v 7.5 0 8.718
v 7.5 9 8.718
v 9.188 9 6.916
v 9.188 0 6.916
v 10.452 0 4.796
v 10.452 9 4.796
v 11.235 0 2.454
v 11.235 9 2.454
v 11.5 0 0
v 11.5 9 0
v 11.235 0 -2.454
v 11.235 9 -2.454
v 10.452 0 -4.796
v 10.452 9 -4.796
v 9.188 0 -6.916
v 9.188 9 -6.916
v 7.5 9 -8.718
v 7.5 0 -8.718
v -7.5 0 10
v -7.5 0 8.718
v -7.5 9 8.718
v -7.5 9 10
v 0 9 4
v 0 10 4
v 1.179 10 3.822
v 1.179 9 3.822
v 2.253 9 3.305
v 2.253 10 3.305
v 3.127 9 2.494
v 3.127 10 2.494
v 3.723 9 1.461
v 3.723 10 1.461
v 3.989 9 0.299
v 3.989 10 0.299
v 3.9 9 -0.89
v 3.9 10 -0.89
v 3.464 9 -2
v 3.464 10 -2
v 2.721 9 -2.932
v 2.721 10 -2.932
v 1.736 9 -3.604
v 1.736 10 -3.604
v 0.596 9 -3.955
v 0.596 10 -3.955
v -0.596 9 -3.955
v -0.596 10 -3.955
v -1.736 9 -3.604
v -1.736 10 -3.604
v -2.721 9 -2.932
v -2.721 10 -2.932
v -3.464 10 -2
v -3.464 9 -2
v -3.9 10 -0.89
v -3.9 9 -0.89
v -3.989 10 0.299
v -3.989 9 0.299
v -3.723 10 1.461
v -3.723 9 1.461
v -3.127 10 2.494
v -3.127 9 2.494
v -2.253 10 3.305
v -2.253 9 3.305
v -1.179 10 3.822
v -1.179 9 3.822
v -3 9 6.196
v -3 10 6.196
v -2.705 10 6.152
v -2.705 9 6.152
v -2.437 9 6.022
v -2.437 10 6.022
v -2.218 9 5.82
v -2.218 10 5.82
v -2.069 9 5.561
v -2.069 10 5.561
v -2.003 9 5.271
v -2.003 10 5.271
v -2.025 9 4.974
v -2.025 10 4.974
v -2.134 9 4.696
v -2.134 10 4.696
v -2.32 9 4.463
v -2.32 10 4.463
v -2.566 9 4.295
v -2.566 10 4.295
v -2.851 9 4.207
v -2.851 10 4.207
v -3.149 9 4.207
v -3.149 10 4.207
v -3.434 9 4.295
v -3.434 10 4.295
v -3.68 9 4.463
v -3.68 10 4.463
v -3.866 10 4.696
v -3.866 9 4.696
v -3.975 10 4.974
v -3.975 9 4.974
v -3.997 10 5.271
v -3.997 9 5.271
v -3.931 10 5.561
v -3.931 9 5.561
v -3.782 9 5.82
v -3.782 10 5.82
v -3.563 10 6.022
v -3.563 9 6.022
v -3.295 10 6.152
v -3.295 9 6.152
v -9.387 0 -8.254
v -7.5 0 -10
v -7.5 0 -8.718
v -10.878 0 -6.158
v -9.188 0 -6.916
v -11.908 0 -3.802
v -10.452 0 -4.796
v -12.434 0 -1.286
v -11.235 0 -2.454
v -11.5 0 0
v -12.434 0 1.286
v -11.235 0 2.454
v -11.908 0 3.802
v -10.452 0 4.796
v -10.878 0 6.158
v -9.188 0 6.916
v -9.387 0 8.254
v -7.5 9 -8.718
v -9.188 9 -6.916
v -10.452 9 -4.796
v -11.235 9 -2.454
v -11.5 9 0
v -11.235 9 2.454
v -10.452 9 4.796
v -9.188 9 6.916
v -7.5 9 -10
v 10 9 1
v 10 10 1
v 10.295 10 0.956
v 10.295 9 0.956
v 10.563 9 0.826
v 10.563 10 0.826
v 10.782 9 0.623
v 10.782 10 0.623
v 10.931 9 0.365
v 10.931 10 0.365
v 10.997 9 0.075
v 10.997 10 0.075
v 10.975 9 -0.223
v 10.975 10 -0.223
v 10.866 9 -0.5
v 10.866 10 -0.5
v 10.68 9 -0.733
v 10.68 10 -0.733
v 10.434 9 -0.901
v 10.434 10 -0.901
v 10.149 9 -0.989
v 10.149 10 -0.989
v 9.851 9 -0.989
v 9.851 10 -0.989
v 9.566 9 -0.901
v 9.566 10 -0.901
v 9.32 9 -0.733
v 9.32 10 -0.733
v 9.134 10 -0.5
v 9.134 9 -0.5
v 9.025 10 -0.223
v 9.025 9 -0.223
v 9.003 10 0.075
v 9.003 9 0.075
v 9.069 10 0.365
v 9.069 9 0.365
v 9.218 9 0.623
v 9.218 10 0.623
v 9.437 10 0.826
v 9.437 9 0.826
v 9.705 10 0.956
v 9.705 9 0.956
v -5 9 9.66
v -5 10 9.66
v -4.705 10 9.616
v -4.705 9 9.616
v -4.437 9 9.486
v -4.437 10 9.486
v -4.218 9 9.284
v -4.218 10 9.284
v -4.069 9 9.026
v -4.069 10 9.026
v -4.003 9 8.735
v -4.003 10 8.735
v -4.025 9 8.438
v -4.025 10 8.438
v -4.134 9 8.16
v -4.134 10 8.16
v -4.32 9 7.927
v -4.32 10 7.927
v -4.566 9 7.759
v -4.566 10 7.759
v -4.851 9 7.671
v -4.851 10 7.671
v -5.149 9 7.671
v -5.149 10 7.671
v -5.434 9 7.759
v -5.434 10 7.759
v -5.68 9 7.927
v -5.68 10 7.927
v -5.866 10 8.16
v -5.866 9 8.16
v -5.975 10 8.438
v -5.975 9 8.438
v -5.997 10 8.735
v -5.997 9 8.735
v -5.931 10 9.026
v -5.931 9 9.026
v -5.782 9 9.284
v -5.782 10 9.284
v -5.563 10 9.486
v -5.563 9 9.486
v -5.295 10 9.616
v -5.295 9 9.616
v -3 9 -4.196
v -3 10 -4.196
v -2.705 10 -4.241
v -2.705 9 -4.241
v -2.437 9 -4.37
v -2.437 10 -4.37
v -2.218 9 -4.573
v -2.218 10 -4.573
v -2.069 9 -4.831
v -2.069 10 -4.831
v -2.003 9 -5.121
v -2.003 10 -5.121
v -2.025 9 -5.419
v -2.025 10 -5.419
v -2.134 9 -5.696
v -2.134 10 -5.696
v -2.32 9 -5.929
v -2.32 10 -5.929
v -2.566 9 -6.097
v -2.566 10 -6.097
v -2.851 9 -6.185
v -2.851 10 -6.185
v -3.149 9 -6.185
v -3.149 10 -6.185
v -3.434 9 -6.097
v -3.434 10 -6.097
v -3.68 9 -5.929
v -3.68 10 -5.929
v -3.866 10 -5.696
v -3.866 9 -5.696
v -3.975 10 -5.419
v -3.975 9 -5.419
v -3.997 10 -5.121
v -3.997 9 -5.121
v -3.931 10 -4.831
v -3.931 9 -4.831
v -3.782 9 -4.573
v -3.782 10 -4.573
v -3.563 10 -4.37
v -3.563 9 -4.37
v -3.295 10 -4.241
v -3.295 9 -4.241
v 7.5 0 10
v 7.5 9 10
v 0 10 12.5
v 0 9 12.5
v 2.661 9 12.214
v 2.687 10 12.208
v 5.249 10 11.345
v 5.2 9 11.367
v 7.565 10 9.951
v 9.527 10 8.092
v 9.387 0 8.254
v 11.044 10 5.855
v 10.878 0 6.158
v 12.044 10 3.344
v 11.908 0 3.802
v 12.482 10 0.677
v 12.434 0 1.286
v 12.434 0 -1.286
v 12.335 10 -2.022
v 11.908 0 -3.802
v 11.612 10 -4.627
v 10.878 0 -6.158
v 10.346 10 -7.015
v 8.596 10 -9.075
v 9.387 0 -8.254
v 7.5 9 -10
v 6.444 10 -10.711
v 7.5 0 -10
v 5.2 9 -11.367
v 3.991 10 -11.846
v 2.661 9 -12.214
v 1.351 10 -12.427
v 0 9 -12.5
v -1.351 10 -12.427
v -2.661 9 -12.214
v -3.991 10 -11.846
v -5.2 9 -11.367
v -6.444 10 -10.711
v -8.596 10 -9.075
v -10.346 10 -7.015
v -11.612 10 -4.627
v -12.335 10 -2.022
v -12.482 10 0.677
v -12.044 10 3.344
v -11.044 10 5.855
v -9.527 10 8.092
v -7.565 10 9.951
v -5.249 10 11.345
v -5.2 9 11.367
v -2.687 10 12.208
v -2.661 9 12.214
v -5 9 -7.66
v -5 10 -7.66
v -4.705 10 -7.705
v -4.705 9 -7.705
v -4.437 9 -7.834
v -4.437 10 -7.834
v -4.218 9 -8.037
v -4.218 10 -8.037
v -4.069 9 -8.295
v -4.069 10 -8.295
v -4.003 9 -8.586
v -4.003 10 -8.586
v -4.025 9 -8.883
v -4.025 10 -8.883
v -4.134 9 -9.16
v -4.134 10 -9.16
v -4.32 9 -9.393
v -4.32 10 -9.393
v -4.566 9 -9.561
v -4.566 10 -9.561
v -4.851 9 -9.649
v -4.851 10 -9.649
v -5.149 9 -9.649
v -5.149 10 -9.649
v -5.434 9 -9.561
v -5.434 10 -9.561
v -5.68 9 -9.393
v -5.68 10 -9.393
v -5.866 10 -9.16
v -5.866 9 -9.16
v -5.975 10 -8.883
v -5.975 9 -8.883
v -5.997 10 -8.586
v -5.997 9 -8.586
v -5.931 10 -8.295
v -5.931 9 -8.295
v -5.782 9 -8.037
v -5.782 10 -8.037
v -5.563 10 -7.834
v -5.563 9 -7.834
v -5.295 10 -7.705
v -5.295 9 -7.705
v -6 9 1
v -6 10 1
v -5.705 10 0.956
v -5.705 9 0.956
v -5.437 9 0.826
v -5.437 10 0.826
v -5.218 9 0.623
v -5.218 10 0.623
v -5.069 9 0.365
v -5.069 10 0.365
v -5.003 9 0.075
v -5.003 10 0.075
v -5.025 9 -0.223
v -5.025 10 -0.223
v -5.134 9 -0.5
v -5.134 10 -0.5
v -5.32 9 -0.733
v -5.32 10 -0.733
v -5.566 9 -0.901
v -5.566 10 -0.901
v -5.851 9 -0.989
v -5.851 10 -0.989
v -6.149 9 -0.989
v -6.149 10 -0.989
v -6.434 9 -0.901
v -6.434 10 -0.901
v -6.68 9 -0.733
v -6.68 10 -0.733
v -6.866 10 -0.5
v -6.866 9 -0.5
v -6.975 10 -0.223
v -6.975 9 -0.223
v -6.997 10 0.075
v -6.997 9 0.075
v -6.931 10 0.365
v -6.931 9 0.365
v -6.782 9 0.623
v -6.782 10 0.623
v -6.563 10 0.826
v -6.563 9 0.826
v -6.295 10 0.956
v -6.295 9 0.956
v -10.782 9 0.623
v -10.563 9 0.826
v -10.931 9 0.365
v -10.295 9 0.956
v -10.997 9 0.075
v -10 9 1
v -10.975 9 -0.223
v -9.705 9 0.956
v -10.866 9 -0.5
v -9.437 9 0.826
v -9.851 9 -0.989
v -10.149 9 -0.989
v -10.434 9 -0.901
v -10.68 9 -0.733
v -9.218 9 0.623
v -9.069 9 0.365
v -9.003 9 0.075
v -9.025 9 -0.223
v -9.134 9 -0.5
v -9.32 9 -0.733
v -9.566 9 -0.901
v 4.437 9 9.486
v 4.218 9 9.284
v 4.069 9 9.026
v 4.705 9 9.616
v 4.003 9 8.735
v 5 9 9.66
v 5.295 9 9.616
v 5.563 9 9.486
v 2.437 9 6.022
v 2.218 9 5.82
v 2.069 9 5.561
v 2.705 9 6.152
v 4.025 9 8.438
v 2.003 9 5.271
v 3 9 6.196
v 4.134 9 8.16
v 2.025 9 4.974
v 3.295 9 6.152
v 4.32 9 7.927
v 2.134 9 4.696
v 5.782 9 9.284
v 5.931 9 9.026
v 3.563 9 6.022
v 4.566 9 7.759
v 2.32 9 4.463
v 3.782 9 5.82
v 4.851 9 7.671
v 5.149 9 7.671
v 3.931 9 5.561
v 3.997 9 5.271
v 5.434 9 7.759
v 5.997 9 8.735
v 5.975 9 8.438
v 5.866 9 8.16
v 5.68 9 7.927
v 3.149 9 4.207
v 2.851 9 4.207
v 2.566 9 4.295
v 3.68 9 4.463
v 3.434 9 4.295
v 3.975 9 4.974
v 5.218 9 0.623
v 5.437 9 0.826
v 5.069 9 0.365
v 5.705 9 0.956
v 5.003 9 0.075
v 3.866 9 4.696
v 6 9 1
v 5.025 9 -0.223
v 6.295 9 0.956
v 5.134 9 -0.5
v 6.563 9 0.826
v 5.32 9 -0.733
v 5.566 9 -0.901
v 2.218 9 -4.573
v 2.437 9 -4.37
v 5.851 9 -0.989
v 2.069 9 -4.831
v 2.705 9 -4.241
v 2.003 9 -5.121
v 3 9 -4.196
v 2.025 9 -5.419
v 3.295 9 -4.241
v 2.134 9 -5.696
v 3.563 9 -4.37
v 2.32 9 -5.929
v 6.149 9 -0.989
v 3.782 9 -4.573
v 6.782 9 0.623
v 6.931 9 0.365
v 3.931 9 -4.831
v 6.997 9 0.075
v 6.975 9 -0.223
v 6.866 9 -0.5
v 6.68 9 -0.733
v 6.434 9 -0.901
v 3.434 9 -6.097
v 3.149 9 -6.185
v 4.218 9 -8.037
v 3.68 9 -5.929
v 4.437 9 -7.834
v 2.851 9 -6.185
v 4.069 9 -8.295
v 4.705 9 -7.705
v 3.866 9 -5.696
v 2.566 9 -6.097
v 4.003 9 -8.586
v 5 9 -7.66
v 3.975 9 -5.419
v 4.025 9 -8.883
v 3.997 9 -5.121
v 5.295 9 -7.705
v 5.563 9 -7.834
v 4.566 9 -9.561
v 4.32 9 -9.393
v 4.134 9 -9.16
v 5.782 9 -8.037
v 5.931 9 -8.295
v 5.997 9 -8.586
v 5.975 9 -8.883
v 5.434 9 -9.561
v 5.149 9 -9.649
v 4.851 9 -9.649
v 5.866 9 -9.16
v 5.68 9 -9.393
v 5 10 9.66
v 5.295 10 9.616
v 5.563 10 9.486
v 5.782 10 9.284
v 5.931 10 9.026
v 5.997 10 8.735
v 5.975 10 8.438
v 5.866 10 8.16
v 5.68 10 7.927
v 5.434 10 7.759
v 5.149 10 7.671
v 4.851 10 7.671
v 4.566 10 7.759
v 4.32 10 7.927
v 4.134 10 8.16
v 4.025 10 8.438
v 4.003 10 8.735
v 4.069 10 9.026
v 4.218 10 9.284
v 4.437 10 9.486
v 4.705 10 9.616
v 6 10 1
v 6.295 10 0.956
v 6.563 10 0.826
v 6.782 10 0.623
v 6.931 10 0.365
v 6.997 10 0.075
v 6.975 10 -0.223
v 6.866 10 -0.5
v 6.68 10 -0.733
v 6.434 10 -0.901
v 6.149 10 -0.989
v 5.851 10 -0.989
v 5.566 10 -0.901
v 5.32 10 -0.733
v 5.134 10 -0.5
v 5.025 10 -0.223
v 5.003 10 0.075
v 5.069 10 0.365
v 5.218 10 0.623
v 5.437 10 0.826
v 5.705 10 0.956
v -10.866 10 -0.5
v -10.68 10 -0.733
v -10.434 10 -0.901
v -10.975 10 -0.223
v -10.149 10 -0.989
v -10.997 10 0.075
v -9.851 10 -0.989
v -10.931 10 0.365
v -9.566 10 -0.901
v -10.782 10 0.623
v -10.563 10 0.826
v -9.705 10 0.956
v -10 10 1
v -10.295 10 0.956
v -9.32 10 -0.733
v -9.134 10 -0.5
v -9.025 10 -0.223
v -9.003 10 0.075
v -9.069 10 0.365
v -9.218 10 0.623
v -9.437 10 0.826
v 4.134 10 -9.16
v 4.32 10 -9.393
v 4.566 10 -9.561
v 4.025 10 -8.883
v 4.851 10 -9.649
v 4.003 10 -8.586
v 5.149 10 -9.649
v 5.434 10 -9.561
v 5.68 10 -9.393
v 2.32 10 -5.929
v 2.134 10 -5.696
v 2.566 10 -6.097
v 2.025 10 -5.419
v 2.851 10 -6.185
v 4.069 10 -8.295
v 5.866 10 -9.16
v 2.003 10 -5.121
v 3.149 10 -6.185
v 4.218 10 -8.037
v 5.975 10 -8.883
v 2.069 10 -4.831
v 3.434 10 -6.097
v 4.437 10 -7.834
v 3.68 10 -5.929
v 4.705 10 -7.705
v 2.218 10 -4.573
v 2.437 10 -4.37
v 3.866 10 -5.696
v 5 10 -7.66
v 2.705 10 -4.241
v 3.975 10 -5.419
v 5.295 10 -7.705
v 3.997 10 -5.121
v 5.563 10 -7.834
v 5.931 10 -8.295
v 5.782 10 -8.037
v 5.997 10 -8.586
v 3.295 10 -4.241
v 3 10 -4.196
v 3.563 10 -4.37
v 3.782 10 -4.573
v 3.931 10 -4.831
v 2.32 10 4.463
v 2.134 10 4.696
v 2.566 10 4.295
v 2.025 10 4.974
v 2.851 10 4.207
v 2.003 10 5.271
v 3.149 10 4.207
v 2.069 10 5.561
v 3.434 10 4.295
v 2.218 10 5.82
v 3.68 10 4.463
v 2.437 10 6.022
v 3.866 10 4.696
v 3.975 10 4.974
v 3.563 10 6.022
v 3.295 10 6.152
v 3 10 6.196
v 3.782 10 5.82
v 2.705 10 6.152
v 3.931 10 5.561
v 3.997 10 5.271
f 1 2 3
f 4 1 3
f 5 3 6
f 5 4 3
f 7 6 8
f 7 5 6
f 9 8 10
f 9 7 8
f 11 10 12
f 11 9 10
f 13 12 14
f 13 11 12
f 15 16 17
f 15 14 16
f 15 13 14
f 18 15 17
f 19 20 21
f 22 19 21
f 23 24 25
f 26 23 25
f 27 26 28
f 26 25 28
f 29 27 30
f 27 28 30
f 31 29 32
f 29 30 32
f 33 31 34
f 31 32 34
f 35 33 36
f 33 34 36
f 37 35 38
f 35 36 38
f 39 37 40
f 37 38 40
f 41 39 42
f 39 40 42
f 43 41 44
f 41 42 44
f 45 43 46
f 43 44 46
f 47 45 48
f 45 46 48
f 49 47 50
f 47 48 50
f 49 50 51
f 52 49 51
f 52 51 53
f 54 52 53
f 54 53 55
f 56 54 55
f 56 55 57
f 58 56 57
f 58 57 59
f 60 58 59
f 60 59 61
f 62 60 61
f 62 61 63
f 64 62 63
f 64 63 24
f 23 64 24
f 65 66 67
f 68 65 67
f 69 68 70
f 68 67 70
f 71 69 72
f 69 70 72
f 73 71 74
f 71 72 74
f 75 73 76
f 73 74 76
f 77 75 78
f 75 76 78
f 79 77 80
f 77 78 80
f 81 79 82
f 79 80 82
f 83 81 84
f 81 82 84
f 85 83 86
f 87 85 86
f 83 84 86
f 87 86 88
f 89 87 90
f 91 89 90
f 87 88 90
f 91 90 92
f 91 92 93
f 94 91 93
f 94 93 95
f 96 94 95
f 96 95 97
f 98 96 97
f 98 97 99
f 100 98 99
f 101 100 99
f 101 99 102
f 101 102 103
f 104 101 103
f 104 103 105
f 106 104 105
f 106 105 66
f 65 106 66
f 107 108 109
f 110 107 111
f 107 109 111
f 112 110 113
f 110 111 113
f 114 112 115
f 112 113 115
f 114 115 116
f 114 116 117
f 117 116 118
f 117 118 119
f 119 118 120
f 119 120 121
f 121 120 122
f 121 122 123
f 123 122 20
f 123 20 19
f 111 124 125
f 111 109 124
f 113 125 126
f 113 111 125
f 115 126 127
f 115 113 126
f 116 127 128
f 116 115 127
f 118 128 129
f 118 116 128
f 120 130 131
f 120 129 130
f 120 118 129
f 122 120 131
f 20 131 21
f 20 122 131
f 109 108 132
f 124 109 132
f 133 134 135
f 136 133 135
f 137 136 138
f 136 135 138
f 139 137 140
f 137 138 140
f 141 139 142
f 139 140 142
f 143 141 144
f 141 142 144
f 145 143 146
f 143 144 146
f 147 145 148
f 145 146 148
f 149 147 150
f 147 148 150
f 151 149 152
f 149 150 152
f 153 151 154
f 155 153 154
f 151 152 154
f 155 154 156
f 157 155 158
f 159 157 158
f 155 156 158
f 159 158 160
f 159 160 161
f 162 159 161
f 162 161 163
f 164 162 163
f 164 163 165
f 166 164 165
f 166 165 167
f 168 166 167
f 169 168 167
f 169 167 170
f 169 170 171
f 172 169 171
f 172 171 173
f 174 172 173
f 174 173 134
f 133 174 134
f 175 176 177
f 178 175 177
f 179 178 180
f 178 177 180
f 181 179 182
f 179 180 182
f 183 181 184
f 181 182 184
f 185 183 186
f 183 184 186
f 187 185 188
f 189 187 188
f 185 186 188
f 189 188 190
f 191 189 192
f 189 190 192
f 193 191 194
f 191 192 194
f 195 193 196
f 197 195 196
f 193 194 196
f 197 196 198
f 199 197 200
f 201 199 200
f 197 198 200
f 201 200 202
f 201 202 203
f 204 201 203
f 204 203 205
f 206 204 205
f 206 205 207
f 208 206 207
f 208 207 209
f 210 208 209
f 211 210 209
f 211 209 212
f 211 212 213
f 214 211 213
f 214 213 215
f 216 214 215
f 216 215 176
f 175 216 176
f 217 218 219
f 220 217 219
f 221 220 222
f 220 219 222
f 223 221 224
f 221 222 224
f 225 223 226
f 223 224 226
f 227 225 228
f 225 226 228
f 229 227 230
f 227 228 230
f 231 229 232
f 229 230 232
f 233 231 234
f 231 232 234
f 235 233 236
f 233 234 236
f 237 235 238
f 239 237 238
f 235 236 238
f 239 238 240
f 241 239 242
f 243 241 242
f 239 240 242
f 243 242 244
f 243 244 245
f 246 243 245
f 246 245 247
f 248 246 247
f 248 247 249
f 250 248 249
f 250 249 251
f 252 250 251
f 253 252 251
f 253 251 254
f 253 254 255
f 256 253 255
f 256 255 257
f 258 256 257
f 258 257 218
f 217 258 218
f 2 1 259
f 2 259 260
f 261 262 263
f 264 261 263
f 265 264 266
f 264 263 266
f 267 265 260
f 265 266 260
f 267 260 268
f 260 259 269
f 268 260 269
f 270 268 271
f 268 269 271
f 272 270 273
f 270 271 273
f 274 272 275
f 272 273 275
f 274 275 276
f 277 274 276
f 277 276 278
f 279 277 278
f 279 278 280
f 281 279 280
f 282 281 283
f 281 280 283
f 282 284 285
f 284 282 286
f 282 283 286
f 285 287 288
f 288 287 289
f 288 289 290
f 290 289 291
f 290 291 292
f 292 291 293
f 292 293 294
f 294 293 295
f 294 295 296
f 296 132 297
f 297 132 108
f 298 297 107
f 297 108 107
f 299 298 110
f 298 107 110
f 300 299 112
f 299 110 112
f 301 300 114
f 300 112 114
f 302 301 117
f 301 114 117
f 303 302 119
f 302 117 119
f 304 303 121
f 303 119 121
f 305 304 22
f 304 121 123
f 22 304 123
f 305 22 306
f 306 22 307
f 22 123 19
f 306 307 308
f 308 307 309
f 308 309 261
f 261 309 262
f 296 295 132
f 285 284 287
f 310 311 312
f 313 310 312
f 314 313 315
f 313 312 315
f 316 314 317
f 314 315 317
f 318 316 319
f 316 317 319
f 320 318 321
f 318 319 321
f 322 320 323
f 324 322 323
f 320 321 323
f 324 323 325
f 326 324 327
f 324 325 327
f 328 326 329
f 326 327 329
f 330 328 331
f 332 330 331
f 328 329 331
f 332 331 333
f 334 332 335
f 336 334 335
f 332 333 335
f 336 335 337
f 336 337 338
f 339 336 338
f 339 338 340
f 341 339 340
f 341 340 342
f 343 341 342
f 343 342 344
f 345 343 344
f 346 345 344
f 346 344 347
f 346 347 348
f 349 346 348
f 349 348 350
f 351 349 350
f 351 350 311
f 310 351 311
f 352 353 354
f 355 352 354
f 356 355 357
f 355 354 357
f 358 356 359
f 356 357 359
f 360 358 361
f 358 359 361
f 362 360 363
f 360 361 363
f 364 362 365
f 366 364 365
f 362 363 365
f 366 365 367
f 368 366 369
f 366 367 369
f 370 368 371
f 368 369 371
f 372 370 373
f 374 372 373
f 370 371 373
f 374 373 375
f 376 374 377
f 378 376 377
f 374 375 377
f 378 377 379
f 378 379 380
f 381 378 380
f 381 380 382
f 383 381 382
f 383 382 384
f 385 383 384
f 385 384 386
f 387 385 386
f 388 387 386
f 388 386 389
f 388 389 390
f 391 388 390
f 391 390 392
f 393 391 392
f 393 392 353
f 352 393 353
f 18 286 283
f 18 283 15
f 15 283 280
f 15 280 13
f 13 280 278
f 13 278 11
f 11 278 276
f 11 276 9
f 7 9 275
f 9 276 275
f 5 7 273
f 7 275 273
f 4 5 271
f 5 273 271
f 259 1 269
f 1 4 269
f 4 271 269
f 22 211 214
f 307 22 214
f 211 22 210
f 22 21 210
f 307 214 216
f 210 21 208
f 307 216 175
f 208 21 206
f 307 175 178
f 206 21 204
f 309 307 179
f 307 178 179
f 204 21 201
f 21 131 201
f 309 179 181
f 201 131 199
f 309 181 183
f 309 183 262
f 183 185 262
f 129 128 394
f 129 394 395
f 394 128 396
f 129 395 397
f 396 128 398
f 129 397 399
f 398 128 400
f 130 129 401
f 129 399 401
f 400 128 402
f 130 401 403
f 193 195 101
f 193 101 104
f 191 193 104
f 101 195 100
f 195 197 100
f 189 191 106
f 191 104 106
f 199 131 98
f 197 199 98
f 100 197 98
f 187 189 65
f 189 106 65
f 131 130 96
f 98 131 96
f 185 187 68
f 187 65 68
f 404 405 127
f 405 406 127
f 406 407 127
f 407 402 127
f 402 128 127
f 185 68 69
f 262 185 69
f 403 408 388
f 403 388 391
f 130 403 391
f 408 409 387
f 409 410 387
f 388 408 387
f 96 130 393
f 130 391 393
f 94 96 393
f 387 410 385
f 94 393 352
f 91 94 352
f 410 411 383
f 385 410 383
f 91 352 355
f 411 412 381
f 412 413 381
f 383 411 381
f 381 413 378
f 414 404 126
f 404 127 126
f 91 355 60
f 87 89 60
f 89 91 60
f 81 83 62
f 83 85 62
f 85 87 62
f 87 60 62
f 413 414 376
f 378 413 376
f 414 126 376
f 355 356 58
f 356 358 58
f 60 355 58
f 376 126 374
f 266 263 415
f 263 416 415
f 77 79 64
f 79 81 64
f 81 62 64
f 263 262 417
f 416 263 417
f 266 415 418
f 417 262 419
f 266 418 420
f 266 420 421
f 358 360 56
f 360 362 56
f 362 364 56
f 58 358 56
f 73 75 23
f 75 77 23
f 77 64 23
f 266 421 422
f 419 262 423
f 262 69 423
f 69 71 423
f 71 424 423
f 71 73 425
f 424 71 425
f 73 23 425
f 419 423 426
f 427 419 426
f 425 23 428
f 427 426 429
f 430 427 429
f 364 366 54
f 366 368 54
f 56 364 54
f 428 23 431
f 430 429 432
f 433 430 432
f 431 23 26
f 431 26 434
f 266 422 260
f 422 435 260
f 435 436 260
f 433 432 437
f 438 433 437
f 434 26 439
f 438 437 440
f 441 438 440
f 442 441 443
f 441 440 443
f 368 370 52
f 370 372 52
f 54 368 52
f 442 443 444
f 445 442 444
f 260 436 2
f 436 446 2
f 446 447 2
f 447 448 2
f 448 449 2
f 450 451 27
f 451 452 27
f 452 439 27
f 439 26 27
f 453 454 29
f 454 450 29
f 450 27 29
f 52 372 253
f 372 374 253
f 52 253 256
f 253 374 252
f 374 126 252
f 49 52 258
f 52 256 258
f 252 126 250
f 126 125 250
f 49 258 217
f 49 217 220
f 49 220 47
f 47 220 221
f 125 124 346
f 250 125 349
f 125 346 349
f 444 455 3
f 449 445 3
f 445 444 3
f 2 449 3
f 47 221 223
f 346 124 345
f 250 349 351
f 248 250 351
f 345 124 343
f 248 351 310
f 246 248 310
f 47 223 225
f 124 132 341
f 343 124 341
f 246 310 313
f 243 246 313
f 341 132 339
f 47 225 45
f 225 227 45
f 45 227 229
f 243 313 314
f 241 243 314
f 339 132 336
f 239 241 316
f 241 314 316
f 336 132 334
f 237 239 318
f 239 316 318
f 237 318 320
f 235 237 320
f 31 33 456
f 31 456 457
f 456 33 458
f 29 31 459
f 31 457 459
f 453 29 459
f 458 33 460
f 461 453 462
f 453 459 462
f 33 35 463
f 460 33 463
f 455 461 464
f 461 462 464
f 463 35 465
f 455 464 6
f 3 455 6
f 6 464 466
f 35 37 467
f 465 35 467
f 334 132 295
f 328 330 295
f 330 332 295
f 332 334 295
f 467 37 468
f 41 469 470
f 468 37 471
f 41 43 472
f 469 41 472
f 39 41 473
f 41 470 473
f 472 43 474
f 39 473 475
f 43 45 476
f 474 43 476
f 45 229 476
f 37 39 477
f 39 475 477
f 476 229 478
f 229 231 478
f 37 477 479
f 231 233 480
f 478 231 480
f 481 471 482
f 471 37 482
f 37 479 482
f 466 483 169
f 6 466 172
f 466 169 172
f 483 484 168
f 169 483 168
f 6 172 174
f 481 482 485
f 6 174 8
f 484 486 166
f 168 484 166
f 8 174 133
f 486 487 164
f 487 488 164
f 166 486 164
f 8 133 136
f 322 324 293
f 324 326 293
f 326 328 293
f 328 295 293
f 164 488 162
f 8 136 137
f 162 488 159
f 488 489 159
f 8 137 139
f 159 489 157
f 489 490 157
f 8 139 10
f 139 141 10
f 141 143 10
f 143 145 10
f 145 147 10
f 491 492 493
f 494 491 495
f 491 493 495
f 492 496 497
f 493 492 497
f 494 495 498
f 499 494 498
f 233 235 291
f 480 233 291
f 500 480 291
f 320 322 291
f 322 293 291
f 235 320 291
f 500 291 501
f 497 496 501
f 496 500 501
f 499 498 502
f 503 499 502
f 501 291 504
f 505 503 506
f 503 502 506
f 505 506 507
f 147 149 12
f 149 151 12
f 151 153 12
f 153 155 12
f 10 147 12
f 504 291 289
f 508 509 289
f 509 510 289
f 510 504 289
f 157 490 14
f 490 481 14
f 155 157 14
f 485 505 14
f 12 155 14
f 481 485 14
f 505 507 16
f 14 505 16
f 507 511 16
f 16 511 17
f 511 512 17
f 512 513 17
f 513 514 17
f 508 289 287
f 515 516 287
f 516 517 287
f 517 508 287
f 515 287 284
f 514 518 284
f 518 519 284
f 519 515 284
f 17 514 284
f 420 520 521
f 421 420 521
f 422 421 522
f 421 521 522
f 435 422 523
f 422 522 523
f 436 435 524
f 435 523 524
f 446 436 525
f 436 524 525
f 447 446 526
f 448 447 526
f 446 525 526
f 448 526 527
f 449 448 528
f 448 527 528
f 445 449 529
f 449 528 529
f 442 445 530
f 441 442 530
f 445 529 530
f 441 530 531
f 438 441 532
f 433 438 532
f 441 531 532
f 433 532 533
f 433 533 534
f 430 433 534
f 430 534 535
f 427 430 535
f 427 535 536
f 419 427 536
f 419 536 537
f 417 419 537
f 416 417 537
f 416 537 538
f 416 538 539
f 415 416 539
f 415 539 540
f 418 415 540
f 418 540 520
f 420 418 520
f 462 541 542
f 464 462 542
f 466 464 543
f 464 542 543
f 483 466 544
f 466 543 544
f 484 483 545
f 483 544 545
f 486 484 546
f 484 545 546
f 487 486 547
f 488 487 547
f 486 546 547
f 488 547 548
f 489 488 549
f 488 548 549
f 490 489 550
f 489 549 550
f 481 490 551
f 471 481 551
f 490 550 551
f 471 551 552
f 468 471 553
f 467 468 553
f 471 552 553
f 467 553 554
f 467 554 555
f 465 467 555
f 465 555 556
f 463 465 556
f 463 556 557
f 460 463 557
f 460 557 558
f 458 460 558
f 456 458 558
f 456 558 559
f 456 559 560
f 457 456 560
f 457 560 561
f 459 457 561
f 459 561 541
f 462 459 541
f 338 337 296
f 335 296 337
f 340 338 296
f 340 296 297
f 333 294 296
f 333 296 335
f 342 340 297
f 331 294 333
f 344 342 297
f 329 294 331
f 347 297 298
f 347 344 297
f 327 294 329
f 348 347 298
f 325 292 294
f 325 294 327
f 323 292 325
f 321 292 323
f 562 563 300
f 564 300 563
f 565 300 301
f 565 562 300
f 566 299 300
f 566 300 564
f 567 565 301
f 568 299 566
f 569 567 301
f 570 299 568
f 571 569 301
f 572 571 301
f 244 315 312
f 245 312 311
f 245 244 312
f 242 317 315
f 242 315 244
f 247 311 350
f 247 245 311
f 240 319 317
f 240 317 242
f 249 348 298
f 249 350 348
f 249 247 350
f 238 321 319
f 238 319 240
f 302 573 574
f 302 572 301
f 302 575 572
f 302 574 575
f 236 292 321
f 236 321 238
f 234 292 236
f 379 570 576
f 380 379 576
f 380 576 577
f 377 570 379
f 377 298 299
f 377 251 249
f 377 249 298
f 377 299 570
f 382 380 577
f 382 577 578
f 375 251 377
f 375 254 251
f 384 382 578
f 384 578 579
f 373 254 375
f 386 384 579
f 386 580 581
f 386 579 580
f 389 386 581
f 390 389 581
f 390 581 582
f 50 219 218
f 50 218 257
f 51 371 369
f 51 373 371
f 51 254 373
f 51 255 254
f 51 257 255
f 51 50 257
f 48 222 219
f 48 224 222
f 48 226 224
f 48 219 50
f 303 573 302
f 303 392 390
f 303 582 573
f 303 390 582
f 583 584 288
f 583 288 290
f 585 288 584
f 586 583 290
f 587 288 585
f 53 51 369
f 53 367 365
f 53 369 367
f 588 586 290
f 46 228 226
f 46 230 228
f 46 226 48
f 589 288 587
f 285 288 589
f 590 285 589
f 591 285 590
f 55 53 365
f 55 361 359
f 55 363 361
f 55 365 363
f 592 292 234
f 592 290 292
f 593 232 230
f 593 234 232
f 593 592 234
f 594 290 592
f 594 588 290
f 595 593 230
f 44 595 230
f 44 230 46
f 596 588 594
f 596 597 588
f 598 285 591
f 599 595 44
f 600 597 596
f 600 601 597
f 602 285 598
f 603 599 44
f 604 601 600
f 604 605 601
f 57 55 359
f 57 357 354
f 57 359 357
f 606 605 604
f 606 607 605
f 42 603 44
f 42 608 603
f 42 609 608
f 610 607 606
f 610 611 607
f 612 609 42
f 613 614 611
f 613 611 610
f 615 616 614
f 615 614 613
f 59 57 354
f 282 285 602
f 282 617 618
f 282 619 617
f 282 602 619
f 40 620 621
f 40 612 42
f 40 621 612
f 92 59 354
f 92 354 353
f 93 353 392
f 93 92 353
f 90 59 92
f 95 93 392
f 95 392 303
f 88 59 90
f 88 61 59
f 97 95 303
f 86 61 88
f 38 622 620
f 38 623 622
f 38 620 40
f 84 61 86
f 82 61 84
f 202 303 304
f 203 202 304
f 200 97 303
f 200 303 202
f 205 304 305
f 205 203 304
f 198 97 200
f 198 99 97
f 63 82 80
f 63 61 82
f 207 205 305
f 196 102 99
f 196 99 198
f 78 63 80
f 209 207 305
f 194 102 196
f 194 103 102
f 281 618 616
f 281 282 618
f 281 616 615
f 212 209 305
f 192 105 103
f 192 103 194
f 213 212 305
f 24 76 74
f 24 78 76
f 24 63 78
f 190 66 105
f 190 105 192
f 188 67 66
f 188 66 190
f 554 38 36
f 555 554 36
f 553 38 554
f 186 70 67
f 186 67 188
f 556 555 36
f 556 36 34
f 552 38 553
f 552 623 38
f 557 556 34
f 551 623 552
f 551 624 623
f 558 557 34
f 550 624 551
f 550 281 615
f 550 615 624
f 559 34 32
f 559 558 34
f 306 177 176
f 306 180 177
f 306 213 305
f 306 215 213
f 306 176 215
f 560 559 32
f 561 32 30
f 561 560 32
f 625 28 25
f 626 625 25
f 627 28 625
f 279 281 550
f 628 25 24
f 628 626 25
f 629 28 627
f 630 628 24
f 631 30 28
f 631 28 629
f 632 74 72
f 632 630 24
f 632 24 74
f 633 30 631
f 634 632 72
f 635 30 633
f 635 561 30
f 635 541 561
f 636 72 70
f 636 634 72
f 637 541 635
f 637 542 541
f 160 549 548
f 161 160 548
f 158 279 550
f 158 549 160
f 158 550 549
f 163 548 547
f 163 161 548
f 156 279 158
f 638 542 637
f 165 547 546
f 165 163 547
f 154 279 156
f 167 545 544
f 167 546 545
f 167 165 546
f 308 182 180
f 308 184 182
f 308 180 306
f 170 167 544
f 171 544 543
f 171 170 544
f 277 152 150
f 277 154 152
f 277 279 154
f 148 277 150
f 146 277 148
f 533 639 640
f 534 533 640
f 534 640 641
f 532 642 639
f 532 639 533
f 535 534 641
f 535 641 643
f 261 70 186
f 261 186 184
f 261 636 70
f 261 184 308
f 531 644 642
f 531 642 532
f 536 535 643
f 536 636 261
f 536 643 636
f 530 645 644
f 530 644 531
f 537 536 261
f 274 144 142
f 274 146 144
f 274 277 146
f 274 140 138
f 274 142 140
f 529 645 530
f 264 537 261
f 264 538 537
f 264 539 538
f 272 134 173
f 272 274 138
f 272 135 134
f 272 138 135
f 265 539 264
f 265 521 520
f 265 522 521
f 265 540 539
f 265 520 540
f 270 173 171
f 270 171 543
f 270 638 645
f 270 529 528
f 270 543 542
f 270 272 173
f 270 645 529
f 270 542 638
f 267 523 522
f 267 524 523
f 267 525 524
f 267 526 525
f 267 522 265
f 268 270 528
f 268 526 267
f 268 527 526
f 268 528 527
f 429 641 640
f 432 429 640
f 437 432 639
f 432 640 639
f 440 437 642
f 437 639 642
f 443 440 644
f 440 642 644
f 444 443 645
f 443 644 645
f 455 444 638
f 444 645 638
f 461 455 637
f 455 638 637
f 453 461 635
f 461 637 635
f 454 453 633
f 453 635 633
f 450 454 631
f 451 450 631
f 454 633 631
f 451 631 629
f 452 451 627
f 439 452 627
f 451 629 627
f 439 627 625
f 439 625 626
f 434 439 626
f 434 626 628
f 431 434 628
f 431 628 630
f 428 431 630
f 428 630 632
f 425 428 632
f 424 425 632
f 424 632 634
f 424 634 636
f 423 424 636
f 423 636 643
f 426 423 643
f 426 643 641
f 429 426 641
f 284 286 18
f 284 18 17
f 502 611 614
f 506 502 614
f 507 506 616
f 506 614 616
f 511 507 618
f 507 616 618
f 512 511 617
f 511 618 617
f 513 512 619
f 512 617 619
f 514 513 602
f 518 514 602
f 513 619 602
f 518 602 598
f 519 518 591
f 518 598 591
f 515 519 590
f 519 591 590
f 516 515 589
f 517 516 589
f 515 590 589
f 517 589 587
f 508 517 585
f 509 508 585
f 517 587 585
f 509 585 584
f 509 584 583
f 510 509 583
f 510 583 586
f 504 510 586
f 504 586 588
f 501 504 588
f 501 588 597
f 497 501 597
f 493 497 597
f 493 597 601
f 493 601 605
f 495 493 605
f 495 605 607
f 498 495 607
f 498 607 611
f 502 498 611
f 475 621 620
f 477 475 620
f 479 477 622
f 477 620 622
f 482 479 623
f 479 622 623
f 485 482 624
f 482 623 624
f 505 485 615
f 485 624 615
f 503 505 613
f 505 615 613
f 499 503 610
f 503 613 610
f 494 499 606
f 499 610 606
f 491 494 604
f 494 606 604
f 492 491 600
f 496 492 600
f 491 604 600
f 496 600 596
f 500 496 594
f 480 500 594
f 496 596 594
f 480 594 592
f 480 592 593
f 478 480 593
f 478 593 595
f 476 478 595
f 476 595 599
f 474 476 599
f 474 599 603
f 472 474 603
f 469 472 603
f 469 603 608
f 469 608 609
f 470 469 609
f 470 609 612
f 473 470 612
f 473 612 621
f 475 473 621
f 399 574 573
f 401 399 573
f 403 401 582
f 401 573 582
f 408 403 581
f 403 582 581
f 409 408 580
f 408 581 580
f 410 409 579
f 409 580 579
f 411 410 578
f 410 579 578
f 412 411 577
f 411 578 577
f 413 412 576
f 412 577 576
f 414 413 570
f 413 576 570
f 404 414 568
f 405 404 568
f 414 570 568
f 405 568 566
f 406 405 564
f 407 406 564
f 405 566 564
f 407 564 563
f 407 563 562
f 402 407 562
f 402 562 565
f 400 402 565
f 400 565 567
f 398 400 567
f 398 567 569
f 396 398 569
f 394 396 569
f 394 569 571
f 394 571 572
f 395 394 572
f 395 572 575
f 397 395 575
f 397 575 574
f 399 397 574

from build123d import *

# Parameters (mm, degrees)
SKETCH1_R               = 12.5
BOSS_EXTRUDE1_DEPTH     = 10
SHELL1_T                = -1
CUT_EXTRUDE1_DEPTH      = 21.310096012
CUT_EXTRUDE1_DEPTH_BACK = 21.310096012
SKETCH2_W               = 15
SKETCH2_H               = 9
SKETCH3_R               = 1
CUT_EXTRUDE2_DEPTH      = 10
SKETCH4_R               = 4
CUT_EXTRUDE3_DEPTH      = 10


with BuildPart() as part:
    # Sketch1 → Boss-Extrude1 (new body)
    with BuildSketch(Plane(origin=(0, 0, 0), x_dir=(1, 0, 0), z_dir=(0, 1, 0))):
        with Locations(Location((0, 0, 0), (0, 0, 270))):
            Circle(SKETCH1_R)
    extrude(amount=BOSS_EXTRUDE1_DEPTH)

    # Shell1
    shell1_openings = [part.faces().sort_by_distance(p)[0] for p in [
        (0, 0, 0),
    ]]
    offset(amount=SHELL1_T, openings=shell1_openings, kind=Kind.INTERSECTION)

    # Sketch2 → Cut-Extrude1 (cut, two sides: drawn at the far end of the back side and taken through both)
    with BuildSketch(Plane.XY.offset(-CUT_EXTRUDE1_DEPTH_BACK)):
        with Locations((0, 4.5)):
            Rectangle(SKETCH2_W, SKETCH2_H)
    extrude(amount=CUT_EXTRUDE1_DEPTH + CUT_EXTRUDE1_DEPTH_BACK, mode=Mode.SUBTRACT)

    # Sketch3 → Cut-Extrude2 (cut)
    with BuildSketch(Plane(origin=(0, 10, 0), x_dir=(1, 0, 0), z_dir=(0, 1, 0))):
        with Locations(Location((-10, 0, 0), (0, 0, 270))):
            Circle(SKETCH3_R)
        with Locations(Location((-6, 0, 0), (0, 0, 270))):
            Circle(SKETCH3_R)
        with Locations(Location((-5, 8.660254038, 0), (0, 0, 270))):
            Circle(SKETCH3_R)
        with Locations(Location((-3, 5.196152423, 0), (0, 0, 270))):
            Circle(SKETCH3_R)
        with Locations(Location((5, 8.660254038, 0), (0, 0, 270))):
            Circle(SKETCH3_R)
        with Locations(Location((3, 5.196152423, 0), (0, 0, 270))):
            Circle(SKETCH3_R)
        with Locations(Location((10, 0, 0), (0, 0, 270))):
            Circle(SKETCH3_R)
        with Locations(Location((6, 0, 0), (0, 0, 270))):
            Circle(SKETCH3_R)
        with Locations(Location((5, -8.660254038, 0), (0, 0, 270))):
            Circle(SKETCH3_R)
        with Locations(Location((3, -5.196152423, 0), (0, 0, 270))):
            Circle(SKETCH3_R)
        with Locations(Location((-5, -8.660254038, 0), (0, 0, 270))):
            Circle(SKETCH3_R)
        with Locations(Location((-3, -5.196152423, 0), (0, 0, 270))):
            Circle(SKETCH3_R)
    extrude(amount=-CUT_EXTRUDE2_DEPTH, mode=Mode.SUBTRACT)

    # Sketch4 → Cut-Extrude3 (cut)
    with BuildSketch(Plane(origin=(0, 10, 0), x_dir=(1, 0, 0), z_dir=(0, 1, 0))):
        with Locations(Location((0, 0, 0), (0, 0, 270))):
            Circle(SKETCH4_R)
    extrude(amount=-CUT_EXTRUDE3_DEPTH, mode=Mode.SUBTRACT)


solid = part.part
